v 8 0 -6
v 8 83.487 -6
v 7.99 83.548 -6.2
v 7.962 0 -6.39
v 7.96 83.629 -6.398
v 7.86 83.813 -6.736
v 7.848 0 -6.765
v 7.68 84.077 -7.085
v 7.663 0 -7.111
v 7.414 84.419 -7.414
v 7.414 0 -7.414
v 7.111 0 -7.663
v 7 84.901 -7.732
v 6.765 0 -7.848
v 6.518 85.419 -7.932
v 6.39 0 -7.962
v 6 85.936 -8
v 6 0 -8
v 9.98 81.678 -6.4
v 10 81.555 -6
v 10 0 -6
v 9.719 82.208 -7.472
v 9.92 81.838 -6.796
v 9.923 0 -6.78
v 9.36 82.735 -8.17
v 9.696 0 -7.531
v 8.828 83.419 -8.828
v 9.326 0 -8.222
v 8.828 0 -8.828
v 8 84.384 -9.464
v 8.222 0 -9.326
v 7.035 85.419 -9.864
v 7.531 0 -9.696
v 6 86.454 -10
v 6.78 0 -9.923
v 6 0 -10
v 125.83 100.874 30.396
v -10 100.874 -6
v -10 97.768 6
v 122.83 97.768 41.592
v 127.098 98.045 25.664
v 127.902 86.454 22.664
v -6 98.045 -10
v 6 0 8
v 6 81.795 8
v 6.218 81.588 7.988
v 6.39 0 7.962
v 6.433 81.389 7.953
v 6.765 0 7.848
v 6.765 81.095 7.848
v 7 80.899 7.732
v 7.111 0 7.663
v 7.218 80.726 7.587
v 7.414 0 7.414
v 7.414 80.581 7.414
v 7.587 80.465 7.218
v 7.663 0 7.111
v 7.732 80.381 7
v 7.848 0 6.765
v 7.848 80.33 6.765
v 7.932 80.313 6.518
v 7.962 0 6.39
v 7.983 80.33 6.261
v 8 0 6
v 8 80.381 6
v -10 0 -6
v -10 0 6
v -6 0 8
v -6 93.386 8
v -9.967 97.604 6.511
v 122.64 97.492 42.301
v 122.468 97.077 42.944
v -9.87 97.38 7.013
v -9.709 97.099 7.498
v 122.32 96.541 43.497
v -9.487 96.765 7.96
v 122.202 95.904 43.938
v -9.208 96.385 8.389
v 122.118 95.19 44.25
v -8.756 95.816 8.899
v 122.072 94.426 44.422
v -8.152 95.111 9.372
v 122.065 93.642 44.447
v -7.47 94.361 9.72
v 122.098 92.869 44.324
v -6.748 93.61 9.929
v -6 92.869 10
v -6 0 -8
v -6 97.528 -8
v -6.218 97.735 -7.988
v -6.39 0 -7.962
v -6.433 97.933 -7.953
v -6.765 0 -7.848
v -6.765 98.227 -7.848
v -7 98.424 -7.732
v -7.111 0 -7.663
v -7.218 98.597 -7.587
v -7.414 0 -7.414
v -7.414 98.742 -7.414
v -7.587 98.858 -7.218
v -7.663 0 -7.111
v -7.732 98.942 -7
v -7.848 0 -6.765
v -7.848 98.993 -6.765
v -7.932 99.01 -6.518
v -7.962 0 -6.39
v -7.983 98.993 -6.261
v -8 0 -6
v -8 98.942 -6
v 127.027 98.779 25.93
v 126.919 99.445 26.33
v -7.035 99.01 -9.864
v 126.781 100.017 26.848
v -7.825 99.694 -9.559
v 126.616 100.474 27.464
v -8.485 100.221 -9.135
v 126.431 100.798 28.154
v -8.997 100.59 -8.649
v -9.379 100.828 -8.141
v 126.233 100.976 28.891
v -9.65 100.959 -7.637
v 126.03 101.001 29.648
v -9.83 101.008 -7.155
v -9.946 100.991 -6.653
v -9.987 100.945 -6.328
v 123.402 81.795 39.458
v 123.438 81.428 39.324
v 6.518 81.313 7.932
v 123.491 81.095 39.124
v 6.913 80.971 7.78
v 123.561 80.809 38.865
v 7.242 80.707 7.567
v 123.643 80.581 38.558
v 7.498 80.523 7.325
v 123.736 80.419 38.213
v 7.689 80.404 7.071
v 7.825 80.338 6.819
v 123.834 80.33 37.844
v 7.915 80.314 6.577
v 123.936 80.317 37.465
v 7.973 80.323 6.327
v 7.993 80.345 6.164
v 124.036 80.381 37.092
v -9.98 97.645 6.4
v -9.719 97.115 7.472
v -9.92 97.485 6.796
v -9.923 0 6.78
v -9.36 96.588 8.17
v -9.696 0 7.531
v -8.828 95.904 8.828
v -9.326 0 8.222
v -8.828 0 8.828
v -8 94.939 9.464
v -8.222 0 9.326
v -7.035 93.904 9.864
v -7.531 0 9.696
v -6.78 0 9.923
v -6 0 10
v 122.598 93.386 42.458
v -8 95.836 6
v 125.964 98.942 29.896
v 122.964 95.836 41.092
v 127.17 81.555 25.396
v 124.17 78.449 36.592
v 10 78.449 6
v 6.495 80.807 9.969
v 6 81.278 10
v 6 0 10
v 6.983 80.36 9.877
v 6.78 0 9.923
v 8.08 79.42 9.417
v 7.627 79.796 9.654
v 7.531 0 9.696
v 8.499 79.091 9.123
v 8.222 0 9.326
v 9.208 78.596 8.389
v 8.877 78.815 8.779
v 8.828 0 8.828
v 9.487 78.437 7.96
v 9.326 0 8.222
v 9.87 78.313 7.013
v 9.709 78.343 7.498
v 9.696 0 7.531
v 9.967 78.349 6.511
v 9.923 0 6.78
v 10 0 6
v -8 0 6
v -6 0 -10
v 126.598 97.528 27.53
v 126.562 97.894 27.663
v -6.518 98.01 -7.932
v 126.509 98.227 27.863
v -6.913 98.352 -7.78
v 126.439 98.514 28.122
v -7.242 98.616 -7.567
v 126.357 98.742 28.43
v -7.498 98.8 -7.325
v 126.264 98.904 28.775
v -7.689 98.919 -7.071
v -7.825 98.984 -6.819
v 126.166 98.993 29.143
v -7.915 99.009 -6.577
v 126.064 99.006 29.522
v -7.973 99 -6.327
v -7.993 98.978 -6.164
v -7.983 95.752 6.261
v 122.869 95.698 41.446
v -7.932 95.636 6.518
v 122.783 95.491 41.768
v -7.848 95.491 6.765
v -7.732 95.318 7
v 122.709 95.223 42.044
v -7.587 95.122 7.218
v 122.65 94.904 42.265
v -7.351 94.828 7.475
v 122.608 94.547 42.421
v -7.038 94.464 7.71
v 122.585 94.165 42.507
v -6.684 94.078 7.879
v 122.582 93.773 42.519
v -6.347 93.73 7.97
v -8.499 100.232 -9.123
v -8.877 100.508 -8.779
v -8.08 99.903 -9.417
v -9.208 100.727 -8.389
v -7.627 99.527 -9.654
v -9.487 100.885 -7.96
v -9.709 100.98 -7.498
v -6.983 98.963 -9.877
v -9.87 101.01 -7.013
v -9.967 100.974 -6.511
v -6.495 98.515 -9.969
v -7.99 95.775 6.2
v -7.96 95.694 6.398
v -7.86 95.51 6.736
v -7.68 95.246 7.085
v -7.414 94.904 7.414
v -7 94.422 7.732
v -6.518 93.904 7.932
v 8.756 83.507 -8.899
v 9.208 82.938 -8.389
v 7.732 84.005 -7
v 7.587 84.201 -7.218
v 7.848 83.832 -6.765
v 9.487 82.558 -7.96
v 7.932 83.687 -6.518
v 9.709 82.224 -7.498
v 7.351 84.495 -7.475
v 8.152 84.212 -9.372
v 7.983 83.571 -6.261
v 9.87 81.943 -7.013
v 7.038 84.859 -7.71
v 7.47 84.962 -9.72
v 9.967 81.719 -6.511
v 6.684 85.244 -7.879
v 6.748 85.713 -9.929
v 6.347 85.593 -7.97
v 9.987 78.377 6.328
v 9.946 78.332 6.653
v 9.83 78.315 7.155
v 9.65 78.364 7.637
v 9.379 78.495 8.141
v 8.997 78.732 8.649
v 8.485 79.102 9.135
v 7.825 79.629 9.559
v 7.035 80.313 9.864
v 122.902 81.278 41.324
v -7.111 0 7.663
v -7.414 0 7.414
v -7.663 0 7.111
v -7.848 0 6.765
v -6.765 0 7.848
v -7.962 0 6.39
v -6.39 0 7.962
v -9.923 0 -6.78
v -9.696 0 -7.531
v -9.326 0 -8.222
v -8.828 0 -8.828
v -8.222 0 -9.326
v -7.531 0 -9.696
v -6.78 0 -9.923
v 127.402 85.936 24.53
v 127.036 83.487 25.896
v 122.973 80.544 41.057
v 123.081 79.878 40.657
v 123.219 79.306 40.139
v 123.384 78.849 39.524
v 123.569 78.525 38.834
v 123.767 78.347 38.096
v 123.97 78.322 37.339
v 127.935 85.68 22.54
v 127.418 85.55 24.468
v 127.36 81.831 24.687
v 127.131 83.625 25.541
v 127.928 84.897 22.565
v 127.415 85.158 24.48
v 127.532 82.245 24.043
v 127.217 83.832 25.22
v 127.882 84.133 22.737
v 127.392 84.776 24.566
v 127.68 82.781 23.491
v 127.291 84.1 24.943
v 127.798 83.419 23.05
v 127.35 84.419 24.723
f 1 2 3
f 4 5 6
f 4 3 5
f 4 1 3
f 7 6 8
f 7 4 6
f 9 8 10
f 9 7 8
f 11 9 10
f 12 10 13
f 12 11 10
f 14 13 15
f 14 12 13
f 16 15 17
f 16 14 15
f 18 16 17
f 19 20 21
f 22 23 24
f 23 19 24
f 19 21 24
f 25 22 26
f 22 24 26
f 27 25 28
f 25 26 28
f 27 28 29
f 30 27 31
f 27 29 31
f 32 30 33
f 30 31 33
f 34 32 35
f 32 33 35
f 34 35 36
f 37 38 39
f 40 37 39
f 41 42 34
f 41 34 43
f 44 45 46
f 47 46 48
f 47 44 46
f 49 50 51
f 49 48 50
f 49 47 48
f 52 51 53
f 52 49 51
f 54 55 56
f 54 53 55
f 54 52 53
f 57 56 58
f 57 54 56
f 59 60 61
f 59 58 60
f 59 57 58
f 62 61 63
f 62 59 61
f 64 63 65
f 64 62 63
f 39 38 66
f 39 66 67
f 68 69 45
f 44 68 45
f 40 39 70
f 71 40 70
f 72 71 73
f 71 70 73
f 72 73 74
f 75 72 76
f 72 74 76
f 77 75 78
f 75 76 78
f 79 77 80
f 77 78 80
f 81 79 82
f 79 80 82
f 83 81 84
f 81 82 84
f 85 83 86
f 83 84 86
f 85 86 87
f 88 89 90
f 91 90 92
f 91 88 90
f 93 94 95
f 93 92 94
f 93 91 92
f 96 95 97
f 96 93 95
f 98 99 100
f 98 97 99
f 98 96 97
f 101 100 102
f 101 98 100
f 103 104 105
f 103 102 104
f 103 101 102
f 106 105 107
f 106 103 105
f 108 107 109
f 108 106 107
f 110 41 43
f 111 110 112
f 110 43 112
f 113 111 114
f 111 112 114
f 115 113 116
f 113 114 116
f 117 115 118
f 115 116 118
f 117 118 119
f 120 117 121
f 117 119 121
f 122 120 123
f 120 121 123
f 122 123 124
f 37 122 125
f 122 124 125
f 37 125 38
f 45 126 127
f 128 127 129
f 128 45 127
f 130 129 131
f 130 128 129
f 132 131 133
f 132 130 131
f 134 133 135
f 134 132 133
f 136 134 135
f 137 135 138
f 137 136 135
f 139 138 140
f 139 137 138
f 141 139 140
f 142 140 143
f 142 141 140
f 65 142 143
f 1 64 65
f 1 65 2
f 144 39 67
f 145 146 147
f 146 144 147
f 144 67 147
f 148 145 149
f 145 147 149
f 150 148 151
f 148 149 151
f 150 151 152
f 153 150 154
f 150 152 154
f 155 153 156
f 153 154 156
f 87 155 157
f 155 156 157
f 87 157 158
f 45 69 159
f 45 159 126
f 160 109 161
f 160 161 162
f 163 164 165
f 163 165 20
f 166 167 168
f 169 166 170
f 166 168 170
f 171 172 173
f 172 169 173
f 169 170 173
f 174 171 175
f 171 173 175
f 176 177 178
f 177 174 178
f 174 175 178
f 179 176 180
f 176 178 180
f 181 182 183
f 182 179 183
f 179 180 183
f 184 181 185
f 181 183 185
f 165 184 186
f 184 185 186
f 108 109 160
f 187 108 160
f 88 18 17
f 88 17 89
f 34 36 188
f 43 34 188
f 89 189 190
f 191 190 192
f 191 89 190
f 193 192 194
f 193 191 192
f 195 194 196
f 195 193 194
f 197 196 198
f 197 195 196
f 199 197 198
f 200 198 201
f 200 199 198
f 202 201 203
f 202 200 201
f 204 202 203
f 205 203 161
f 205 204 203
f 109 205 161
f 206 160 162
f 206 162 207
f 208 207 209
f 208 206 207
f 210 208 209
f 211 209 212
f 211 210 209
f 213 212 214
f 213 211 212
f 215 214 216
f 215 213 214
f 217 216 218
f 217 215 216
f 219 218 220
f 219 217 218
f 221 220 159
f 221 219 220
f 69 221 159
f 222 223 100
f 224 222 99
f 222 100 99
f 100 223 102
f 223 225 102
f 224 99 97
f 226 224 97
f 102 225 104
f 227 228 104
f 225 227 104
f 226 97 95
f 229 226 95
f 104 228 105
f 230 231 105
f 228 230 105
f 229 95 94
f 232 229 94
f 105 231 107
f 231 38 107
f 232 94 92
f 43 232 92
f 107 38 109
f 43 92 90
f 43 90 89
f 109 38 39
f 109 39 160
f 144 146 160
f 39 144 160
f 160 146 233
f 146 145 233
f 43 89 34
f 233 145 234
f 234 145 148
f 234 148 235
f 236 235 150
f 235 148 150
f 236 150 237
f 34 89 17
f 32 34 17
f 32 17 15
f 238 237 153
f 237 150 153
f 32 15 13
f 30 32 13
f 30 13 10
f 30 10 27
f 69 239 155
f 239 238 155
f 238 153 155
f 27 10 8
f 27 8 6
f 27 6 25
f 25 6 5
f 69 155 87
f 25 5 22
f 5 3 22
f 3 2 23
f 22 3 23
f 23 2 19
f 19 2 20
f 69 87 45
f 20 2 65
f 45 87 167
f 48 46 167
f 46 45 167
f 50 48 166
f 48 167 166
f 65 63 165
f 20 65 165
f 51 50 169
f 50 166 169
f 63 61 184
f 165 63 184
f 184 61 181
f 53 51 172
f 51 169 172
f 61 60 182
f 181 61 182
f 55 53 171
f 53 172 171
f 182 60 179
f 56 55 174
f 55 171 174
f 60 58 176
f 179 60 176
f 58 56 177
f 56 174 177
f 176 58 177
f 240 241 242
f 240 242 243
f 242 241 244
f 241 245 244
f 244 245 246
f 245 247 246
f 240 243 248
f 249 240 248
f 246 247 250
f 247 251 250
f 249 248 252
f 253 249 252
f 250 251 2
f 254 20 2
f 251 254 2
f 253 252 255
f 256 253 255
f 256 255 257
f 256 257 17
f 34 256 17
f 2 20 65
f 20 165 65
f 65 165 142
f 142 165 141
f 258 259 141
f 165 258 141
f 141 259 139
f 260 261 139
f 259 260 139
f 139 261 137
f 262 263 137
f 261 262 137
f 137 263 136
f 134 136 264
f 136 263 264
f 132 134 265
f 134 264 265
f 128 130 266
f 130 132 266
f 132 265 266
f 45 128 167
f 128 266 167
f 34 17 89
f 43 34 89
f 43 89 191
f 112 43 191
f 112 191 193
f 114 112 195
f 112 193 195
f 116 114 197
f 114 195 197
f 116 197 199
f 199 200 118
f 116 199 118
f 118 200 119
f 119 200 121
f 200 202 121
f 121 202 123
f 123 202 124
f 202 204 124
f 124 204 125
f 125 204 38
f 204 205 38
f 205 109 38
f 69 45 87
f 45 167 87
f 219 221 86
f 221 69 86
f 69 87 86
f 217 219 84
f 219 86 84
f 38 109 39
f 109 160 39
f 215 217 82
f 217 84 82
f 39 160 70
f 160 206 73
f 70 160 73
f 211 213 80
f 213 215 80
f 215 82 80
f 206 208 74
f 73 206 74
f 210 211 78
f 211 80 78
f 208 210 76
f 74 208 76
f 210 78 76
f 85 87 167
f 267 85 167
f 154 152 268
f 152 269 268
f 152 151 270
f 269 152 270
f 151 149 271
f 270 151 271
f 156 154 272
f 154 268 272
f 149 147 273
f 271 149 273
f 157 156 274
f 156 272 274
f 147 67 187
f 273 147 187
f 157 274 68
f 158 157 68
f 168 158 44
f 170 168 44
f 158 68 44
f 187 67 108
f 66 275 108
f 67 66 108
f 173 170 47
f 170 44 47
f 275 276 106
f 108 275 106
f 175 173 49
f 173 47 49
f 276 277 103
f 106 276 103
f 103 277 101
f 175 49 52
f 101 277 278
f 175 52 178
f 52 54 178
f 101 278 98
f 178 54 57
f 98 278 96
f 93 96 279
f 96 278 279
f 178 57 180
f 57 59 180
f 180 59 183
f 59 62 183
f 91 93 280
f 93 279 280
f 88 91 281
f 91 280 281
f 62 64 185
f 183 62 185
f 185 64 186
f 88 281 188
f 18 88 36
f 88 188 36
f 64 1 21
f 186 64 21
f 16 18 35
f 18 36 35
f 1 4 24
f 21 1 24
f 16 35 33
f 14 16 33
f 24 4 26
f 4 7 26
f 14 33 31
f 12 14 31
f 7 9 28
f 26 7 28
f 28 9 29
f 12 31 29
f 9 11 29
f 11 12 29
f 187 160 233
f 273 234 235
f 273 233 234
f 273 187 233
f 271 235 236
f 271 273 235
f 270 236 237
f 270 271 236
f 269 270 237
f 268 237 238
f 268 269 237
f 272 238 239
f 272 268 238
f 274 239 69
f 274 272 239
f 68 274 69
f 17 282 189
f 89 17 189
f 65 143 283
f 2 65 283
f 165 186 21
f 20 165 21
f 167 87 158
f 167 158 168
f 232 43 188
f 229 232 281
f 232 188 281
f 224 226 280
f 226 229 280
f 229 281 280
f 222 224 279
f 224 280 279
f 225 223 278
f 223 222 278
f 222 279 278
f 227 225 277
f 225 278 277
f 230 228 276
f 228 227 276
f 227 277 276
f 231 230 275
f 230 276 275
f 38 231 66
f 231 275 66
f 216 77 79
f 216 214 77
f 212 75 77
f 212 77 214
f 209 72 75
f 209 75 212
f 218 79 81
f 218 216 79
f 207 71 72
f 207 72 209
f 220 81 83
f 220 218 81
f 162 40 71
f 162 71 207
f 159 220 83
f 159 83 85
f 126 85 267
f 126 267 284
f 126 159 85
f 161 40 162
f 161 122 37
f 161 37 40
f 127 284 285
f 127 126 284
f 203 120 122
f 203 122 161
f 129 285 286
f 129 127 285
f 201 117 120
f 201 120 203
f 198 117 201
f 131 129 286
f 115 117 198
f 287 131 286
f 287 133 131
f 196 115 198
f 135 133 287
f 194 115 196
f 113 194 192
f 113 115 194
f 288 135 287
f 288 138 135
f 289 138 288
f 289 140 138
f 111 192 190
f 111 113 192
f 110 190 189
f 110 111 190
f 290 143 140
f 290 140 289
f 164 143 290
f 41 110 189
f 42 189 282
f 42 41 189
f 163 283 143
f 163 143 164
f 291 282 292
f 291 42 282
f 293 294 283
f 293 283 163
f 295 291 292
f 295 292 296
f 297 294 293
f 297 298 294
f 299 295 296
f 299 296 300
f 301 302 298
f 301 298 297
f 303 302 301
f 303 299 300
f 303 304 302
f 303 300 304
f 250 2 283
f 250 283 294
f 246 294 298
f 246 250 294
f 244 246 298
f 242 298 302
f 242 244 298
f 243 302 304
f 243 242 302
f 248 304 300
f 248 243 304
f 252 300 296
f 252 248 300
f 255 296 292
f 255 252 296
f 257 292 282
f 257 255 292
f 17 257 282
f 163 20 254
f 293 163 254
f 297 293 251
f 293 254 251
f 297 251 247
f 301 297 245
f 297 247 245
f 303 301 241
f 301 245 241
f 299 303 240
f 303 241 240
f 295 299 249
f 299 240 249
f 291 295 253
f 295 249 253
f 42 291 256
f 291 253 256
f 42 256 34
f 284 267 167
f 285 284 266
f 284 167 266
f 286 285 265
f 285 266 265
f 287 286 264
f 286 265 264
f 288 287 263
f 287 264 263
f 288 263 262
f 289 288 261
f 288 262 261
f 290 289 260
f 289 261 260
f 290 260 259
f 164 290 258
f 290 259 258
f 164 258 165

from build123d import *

# Parameters (mm, degrees)
QUADRATISCHES_HOHLPROFIL_20_X_20_X_2_24_DEPTH = 104.803576768
QUADRATISCHES_HOHLPROFIL_20_X_20_X_2_3_DEPTH  = 144.551658175


with BuildPart() as part:
    # Sketch1 → Quadratisches hohlprofil 20 X 20 X 2(24) (new body)
    with BuildSketch(Plane(origin=(0, 0, 0), x_dir=(1, 0, 0), z_dir=(0, 1, 0))):
        with BuildLine():
            Line((-6, -10), (6, -10))
            ThreePointArc((6, -10), (8.828427125, -8.828427125), (10, -6))
            Line((10, -6), (10, 6))
            ThreePointArc((10, 6), (8.828427125, 8.828427125), (6, 10))
            Line((6, 10), (-6, 10))
            ThreePointArc((-6, 10), (-8.828427125, 8.828427125), (-10, 6))
            Line((-10, 6), (-10, -6))
            ThreePointArc((-10, -6), (-8.828427125, -8.828427125), (-6, -10))
        make_face()
        with BuildLine():
            Line((-6, -8), (6, -8))
            ThreePointArc((6, -8), (7.414213562, -7.414213562), (8, -6))
            Line((8, -6), (8, 6))
            ThreePointArc((8, 6), (7.414213562, 7.414213562), (6, 8))
            Line((6, 8), (-6, 8))
            ThreePointArc((-6, 8), (-7.414213562, 7.414213562), (-8, 6))
            Line((-8, 6), (-8, -6))
            ThreePointArc((-8, -6), (-7.414213562, -7.414213562), (-6, -8))
        make_face(mode=Mode.SUBTRACT)
    extrude(amount=QUADRATISCHES_HOHLPROFIL_20_X_20_X_2_24_DEPTH)

    # Quadratisches hohlprofil 20 X 20 X 2 2
    split(bisect_by=Plane(origin=(0, 89.661441144, 0), x_dir=(0.719254597, -0.694746591, 0), z_dir=(-0.683012702, -0.707106781, -0.183012702)), keep=Keep.TOP)


with BuildPart() as body_2:
    # Sketch1 on segment 2 (carried to segment 2) → Quadratisches hohlprofil 20 X 20 X 2 3 (new body)
    with BuildSketch(Plane(origin=(-14.626179864, 89.661441144, -3.919073083), x_dir=(0.066987298, -0.965925826, -0.25), z_dir=(0.965925826, 0, 0.258819045))):
        with BuildLine():
            Line((-6, -10), (6, -10))
            ThreePointArc((6, -10), (8.828427125, -8.828427125), (10, -6))
            Line((10, -6), (10, 6))
            ThreePointArc((10, 6), (8.828427125, 8.828427125), (6, 10))
            Line((6, 10), (-6, 10))
            ThreePointArc((-6, 10), (-8.828427125, 8.828427125), (-10, 6))
            Line((-10, 6), (-10, -6))
            ThreePointArc((-10, -6), (-8.828427125, -8.828427125), (-6, -10))
        make_face()
        with BuildLine():
            Line((-6, -8), (6, -8))
            ThreePointArc((6, -8), (7.414213562, -7.414213562), (8, -6))
            Line((8, -6), (8, 6))
            ThreePointArc((8, 6), (7.414213562, 7.414213562), (6, 8))
            Line((6, 8), (-6, 8))
            ThreePointArc((-6, 8), (-7.414213562, 7.414213562), (-8, 6))
            Line((-8, 6), (-8, -6))
            ThreePointArc((-8, -6), (-7.414213562, -7.414213562), (-6, -8))
        make_face(mode=Mode.SUBTRACT)
    extrude(amount=QUADRATISCHES_HOHLPROFIL_20_X_20_X_2_3_DEPTH)

    # Quadratisches hohlprofil 20 X 20 X 2 3 m
    split(bisect_by=Plane(origin=(0, 89.661441144, 0), x_dir=(-0.719254597, 0.694746591, 0), z_dir=(0.683012702, 0.707106781, 0.183012702)), keep=Keep.TOP)


solid = Compound([part.part, body_2.part])
